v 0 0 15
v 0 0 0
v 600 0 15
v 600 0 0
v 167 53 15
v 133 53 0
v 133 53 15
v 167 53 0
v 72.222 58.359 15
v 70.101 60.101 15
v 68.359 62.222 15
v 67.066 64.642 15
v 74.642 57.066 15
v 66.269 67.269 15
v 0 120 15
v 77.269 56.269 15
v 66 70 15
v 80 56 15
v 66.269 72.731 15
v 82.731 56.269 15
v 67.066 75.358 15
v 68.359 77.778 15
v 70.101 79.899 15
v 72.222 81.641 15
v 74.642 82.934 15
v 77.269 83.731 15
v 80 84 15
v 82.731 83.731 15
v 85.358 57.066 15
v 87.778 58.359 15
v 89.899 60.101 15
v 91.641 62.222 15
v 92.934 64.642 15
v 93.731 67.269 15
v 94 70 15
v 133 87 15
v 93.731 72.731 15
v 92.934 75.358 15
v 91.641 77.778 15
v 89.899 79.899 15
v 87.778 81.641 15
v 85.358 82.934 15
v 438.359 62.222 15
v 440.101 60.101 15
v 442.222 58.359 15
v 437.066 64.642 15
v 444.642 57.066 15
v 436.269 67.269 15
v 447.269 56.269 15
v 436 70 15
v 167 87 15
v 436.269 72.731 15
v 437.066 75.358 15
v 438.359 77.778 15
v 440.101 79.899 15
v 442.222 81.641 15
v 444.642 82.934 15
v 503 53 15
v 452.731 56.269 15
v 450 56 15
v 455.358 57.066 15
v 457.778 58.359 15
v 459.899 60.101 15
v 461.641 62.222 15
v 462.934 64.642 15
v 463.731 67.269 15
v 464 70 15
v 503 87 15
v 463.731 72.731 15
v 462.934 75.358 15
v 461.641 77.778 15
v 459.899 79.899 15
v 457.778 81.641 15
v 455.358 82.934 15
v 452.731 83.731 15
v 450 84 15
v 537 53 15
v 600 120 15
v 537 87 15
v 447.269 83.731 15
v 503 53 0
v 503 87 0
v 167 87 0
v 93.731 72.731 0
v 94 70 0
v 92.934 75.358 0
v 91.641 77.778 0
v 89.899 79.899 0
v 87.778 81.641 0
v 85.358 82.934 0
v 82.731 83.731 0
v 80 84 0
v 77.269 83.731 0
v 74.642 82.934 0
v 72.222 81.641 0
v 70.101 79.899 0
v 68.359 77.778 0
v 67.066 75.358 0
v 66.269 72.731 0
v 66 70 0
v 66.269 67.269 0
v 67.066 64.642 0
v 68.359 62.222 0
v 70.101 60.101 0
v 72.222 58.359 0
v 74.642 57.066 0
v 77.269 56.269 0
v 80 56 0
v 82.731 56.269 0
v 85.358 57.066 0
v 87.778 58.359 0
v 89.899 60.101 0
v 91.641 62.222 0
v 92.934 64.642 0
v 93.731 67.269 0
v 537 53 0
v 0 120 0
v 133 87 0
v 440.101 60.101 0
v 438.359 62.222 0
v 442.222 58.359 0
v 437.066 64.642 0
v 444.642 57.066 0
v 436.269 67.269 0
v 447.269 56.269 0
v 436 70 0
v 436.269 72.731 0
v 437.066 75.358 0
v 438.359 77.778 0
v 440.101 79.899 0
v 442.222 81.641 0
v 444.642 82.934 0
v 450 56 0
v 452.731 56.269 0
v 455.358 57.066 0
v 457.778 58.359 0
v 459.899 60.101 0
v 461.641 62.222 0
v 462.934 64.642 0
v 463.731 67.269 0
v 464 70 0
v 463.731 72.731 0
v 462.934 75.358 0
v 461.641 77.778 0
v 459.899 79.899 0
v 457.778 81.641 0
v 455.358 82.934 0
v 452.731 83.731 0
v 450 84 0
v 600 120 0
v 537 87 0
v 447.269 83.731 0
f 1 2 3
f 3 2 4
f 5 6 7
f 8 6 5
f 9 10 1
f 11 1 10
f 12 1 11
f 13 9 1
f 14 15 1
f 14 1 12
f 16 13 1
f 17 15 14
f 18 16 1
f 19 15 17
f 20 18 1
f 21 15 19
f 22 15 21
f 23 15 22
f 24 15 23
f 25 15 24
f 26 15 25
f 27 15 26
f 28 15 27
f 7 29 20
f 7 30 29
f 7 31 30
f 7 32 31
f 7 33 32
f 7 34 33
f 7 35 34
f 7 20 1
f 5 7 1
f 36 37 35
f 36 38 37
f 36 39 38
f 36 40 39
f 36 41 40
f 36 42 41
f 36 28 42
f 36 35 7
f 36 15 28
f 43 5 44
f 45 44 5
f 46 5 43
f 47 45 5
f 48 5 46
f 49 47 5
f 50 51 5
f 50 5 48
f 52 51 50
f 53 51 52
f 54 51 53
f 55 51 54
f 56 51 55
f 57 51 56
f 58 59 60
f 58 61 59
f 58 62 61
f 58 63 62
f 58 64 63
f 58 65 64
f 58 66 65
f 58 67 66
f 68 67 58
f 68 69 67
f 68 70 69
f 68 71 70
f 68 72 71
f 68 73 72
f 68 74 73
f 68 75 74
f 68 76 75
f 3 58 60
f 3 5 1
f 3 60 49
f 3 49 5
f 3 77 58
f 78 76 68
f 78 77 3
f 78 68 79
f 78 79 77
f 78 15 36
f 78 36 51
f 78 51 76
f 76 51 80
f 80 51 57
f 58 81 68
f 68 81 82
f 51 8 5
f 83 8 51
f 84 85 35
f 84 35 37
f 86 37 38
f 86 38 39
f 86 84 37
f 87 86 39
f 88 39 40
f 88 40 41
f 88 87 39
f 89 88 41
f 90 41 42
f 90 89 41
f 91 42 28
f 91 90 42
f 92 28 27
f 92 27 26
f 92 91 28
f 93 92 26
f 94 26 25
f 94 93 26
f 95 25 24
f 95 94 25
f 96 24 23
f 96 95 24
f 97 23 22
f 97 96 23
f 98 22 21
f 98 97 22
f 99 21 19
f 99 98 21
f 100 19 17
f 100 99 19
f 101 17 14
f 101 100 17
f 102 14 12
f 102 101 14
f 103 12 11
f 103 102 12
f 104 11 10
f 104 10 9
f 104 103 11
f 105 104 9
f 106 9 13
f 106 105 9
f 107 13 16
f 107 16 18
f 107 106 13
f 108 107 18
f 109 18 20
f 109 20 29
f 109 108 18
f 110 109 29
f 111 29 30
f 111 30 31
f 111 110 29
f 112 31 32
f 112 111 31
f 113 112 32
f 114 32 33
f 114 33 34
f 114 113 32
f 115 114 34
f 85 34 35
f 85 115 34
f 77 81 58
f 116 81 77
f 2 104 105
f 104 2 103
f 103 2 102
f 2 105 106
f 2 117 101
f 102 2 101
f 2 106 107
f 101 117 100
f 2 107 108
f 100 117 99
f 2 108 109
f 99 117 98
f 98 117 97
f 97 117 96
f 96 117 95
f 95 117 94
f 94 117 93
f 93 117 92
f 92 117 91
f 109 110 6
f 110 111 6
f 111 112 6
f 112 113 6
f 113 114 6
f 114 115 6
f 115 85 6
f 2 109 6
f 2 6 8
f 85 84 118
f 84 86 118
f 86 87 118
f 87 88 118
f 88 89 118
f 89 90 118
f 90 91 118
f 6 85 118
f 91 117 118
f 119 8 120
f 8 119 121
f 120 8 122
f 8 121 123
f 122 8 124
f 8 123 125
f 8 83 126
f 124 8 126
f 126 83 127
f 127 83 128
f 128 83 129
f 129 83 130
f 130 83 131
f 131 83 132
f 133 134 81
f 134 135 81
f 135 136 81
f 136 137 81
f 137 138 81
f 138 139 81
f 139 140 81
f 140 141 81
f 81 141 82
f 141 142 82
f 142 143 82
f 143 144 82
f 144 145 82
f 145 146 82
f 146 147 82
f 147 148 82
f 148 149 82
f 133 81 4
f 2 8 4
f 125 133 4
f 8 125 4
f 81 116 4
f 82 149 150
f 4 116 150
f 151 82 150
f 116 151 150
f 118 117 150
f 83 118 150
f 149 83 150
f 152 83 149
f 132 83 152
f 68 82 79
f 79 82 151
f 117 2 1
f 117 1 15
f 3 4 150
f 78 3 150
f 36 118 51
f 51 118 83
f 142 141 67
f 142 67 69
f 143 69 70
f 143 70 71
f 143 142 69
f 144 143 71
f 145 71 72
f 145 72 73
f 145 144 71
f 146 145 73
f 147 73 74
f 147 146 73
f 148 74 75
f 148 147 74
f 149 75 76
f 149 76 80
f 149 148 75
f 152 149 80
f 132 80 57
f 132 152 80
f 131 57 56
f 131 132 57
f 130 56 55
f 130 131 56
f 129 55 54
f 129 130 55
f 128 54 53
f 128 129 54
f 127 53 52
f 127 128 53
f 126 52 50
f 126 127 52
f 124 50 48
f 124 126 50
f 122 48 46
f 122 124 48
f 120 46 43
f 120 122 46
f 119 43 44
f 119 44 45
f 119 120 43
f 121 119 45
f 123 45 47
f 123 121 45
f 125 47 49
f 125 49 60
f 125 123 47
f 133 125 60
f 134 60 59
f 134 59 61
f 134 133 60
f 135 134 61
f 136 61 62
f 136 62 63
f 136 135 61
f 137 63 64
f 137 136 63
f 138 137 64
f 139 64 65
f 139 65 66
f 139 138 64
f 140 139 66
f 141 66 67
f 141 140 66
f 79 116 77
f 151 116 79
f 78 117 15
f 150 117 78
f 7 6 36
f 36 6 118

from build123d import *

# Parameters (mm, degrees)
SKETCH_W   = 600
SKETCH_H   = 120
SKETCH_R   = 14
SKETCH_W_2 = 34
SKETCH_H_2 = 34
PAD_DEPTH  = 15


with BuildPart() as part:
    # Sketch → Pad (new body)
    with BuildSketch(Plane.XY):
        with Locations((300, 60)):
            Rectangle(SKETCH_W, SKETCH_H)
        with Locations((80, 70)):
            Circle(SKETCH_R, mode=Mode.SUBTRACT)
        with Locations((450, 70)):
            Circle(SKETCH_R, mode=Mode.SUBTRACT)
        with Locations((150, 70)):
            Rectangle(SKETCH_W_2, SKETCH_H_2, mode=Mode.SUBTRACT)
        with Locations((520, 70)):
            Rectangle(SKETCH_W_2, SKETCH_H_2, mode=Mode.SUBTRACT)
    extrude(amount=PAD_DEPTH)


solid = part.part
